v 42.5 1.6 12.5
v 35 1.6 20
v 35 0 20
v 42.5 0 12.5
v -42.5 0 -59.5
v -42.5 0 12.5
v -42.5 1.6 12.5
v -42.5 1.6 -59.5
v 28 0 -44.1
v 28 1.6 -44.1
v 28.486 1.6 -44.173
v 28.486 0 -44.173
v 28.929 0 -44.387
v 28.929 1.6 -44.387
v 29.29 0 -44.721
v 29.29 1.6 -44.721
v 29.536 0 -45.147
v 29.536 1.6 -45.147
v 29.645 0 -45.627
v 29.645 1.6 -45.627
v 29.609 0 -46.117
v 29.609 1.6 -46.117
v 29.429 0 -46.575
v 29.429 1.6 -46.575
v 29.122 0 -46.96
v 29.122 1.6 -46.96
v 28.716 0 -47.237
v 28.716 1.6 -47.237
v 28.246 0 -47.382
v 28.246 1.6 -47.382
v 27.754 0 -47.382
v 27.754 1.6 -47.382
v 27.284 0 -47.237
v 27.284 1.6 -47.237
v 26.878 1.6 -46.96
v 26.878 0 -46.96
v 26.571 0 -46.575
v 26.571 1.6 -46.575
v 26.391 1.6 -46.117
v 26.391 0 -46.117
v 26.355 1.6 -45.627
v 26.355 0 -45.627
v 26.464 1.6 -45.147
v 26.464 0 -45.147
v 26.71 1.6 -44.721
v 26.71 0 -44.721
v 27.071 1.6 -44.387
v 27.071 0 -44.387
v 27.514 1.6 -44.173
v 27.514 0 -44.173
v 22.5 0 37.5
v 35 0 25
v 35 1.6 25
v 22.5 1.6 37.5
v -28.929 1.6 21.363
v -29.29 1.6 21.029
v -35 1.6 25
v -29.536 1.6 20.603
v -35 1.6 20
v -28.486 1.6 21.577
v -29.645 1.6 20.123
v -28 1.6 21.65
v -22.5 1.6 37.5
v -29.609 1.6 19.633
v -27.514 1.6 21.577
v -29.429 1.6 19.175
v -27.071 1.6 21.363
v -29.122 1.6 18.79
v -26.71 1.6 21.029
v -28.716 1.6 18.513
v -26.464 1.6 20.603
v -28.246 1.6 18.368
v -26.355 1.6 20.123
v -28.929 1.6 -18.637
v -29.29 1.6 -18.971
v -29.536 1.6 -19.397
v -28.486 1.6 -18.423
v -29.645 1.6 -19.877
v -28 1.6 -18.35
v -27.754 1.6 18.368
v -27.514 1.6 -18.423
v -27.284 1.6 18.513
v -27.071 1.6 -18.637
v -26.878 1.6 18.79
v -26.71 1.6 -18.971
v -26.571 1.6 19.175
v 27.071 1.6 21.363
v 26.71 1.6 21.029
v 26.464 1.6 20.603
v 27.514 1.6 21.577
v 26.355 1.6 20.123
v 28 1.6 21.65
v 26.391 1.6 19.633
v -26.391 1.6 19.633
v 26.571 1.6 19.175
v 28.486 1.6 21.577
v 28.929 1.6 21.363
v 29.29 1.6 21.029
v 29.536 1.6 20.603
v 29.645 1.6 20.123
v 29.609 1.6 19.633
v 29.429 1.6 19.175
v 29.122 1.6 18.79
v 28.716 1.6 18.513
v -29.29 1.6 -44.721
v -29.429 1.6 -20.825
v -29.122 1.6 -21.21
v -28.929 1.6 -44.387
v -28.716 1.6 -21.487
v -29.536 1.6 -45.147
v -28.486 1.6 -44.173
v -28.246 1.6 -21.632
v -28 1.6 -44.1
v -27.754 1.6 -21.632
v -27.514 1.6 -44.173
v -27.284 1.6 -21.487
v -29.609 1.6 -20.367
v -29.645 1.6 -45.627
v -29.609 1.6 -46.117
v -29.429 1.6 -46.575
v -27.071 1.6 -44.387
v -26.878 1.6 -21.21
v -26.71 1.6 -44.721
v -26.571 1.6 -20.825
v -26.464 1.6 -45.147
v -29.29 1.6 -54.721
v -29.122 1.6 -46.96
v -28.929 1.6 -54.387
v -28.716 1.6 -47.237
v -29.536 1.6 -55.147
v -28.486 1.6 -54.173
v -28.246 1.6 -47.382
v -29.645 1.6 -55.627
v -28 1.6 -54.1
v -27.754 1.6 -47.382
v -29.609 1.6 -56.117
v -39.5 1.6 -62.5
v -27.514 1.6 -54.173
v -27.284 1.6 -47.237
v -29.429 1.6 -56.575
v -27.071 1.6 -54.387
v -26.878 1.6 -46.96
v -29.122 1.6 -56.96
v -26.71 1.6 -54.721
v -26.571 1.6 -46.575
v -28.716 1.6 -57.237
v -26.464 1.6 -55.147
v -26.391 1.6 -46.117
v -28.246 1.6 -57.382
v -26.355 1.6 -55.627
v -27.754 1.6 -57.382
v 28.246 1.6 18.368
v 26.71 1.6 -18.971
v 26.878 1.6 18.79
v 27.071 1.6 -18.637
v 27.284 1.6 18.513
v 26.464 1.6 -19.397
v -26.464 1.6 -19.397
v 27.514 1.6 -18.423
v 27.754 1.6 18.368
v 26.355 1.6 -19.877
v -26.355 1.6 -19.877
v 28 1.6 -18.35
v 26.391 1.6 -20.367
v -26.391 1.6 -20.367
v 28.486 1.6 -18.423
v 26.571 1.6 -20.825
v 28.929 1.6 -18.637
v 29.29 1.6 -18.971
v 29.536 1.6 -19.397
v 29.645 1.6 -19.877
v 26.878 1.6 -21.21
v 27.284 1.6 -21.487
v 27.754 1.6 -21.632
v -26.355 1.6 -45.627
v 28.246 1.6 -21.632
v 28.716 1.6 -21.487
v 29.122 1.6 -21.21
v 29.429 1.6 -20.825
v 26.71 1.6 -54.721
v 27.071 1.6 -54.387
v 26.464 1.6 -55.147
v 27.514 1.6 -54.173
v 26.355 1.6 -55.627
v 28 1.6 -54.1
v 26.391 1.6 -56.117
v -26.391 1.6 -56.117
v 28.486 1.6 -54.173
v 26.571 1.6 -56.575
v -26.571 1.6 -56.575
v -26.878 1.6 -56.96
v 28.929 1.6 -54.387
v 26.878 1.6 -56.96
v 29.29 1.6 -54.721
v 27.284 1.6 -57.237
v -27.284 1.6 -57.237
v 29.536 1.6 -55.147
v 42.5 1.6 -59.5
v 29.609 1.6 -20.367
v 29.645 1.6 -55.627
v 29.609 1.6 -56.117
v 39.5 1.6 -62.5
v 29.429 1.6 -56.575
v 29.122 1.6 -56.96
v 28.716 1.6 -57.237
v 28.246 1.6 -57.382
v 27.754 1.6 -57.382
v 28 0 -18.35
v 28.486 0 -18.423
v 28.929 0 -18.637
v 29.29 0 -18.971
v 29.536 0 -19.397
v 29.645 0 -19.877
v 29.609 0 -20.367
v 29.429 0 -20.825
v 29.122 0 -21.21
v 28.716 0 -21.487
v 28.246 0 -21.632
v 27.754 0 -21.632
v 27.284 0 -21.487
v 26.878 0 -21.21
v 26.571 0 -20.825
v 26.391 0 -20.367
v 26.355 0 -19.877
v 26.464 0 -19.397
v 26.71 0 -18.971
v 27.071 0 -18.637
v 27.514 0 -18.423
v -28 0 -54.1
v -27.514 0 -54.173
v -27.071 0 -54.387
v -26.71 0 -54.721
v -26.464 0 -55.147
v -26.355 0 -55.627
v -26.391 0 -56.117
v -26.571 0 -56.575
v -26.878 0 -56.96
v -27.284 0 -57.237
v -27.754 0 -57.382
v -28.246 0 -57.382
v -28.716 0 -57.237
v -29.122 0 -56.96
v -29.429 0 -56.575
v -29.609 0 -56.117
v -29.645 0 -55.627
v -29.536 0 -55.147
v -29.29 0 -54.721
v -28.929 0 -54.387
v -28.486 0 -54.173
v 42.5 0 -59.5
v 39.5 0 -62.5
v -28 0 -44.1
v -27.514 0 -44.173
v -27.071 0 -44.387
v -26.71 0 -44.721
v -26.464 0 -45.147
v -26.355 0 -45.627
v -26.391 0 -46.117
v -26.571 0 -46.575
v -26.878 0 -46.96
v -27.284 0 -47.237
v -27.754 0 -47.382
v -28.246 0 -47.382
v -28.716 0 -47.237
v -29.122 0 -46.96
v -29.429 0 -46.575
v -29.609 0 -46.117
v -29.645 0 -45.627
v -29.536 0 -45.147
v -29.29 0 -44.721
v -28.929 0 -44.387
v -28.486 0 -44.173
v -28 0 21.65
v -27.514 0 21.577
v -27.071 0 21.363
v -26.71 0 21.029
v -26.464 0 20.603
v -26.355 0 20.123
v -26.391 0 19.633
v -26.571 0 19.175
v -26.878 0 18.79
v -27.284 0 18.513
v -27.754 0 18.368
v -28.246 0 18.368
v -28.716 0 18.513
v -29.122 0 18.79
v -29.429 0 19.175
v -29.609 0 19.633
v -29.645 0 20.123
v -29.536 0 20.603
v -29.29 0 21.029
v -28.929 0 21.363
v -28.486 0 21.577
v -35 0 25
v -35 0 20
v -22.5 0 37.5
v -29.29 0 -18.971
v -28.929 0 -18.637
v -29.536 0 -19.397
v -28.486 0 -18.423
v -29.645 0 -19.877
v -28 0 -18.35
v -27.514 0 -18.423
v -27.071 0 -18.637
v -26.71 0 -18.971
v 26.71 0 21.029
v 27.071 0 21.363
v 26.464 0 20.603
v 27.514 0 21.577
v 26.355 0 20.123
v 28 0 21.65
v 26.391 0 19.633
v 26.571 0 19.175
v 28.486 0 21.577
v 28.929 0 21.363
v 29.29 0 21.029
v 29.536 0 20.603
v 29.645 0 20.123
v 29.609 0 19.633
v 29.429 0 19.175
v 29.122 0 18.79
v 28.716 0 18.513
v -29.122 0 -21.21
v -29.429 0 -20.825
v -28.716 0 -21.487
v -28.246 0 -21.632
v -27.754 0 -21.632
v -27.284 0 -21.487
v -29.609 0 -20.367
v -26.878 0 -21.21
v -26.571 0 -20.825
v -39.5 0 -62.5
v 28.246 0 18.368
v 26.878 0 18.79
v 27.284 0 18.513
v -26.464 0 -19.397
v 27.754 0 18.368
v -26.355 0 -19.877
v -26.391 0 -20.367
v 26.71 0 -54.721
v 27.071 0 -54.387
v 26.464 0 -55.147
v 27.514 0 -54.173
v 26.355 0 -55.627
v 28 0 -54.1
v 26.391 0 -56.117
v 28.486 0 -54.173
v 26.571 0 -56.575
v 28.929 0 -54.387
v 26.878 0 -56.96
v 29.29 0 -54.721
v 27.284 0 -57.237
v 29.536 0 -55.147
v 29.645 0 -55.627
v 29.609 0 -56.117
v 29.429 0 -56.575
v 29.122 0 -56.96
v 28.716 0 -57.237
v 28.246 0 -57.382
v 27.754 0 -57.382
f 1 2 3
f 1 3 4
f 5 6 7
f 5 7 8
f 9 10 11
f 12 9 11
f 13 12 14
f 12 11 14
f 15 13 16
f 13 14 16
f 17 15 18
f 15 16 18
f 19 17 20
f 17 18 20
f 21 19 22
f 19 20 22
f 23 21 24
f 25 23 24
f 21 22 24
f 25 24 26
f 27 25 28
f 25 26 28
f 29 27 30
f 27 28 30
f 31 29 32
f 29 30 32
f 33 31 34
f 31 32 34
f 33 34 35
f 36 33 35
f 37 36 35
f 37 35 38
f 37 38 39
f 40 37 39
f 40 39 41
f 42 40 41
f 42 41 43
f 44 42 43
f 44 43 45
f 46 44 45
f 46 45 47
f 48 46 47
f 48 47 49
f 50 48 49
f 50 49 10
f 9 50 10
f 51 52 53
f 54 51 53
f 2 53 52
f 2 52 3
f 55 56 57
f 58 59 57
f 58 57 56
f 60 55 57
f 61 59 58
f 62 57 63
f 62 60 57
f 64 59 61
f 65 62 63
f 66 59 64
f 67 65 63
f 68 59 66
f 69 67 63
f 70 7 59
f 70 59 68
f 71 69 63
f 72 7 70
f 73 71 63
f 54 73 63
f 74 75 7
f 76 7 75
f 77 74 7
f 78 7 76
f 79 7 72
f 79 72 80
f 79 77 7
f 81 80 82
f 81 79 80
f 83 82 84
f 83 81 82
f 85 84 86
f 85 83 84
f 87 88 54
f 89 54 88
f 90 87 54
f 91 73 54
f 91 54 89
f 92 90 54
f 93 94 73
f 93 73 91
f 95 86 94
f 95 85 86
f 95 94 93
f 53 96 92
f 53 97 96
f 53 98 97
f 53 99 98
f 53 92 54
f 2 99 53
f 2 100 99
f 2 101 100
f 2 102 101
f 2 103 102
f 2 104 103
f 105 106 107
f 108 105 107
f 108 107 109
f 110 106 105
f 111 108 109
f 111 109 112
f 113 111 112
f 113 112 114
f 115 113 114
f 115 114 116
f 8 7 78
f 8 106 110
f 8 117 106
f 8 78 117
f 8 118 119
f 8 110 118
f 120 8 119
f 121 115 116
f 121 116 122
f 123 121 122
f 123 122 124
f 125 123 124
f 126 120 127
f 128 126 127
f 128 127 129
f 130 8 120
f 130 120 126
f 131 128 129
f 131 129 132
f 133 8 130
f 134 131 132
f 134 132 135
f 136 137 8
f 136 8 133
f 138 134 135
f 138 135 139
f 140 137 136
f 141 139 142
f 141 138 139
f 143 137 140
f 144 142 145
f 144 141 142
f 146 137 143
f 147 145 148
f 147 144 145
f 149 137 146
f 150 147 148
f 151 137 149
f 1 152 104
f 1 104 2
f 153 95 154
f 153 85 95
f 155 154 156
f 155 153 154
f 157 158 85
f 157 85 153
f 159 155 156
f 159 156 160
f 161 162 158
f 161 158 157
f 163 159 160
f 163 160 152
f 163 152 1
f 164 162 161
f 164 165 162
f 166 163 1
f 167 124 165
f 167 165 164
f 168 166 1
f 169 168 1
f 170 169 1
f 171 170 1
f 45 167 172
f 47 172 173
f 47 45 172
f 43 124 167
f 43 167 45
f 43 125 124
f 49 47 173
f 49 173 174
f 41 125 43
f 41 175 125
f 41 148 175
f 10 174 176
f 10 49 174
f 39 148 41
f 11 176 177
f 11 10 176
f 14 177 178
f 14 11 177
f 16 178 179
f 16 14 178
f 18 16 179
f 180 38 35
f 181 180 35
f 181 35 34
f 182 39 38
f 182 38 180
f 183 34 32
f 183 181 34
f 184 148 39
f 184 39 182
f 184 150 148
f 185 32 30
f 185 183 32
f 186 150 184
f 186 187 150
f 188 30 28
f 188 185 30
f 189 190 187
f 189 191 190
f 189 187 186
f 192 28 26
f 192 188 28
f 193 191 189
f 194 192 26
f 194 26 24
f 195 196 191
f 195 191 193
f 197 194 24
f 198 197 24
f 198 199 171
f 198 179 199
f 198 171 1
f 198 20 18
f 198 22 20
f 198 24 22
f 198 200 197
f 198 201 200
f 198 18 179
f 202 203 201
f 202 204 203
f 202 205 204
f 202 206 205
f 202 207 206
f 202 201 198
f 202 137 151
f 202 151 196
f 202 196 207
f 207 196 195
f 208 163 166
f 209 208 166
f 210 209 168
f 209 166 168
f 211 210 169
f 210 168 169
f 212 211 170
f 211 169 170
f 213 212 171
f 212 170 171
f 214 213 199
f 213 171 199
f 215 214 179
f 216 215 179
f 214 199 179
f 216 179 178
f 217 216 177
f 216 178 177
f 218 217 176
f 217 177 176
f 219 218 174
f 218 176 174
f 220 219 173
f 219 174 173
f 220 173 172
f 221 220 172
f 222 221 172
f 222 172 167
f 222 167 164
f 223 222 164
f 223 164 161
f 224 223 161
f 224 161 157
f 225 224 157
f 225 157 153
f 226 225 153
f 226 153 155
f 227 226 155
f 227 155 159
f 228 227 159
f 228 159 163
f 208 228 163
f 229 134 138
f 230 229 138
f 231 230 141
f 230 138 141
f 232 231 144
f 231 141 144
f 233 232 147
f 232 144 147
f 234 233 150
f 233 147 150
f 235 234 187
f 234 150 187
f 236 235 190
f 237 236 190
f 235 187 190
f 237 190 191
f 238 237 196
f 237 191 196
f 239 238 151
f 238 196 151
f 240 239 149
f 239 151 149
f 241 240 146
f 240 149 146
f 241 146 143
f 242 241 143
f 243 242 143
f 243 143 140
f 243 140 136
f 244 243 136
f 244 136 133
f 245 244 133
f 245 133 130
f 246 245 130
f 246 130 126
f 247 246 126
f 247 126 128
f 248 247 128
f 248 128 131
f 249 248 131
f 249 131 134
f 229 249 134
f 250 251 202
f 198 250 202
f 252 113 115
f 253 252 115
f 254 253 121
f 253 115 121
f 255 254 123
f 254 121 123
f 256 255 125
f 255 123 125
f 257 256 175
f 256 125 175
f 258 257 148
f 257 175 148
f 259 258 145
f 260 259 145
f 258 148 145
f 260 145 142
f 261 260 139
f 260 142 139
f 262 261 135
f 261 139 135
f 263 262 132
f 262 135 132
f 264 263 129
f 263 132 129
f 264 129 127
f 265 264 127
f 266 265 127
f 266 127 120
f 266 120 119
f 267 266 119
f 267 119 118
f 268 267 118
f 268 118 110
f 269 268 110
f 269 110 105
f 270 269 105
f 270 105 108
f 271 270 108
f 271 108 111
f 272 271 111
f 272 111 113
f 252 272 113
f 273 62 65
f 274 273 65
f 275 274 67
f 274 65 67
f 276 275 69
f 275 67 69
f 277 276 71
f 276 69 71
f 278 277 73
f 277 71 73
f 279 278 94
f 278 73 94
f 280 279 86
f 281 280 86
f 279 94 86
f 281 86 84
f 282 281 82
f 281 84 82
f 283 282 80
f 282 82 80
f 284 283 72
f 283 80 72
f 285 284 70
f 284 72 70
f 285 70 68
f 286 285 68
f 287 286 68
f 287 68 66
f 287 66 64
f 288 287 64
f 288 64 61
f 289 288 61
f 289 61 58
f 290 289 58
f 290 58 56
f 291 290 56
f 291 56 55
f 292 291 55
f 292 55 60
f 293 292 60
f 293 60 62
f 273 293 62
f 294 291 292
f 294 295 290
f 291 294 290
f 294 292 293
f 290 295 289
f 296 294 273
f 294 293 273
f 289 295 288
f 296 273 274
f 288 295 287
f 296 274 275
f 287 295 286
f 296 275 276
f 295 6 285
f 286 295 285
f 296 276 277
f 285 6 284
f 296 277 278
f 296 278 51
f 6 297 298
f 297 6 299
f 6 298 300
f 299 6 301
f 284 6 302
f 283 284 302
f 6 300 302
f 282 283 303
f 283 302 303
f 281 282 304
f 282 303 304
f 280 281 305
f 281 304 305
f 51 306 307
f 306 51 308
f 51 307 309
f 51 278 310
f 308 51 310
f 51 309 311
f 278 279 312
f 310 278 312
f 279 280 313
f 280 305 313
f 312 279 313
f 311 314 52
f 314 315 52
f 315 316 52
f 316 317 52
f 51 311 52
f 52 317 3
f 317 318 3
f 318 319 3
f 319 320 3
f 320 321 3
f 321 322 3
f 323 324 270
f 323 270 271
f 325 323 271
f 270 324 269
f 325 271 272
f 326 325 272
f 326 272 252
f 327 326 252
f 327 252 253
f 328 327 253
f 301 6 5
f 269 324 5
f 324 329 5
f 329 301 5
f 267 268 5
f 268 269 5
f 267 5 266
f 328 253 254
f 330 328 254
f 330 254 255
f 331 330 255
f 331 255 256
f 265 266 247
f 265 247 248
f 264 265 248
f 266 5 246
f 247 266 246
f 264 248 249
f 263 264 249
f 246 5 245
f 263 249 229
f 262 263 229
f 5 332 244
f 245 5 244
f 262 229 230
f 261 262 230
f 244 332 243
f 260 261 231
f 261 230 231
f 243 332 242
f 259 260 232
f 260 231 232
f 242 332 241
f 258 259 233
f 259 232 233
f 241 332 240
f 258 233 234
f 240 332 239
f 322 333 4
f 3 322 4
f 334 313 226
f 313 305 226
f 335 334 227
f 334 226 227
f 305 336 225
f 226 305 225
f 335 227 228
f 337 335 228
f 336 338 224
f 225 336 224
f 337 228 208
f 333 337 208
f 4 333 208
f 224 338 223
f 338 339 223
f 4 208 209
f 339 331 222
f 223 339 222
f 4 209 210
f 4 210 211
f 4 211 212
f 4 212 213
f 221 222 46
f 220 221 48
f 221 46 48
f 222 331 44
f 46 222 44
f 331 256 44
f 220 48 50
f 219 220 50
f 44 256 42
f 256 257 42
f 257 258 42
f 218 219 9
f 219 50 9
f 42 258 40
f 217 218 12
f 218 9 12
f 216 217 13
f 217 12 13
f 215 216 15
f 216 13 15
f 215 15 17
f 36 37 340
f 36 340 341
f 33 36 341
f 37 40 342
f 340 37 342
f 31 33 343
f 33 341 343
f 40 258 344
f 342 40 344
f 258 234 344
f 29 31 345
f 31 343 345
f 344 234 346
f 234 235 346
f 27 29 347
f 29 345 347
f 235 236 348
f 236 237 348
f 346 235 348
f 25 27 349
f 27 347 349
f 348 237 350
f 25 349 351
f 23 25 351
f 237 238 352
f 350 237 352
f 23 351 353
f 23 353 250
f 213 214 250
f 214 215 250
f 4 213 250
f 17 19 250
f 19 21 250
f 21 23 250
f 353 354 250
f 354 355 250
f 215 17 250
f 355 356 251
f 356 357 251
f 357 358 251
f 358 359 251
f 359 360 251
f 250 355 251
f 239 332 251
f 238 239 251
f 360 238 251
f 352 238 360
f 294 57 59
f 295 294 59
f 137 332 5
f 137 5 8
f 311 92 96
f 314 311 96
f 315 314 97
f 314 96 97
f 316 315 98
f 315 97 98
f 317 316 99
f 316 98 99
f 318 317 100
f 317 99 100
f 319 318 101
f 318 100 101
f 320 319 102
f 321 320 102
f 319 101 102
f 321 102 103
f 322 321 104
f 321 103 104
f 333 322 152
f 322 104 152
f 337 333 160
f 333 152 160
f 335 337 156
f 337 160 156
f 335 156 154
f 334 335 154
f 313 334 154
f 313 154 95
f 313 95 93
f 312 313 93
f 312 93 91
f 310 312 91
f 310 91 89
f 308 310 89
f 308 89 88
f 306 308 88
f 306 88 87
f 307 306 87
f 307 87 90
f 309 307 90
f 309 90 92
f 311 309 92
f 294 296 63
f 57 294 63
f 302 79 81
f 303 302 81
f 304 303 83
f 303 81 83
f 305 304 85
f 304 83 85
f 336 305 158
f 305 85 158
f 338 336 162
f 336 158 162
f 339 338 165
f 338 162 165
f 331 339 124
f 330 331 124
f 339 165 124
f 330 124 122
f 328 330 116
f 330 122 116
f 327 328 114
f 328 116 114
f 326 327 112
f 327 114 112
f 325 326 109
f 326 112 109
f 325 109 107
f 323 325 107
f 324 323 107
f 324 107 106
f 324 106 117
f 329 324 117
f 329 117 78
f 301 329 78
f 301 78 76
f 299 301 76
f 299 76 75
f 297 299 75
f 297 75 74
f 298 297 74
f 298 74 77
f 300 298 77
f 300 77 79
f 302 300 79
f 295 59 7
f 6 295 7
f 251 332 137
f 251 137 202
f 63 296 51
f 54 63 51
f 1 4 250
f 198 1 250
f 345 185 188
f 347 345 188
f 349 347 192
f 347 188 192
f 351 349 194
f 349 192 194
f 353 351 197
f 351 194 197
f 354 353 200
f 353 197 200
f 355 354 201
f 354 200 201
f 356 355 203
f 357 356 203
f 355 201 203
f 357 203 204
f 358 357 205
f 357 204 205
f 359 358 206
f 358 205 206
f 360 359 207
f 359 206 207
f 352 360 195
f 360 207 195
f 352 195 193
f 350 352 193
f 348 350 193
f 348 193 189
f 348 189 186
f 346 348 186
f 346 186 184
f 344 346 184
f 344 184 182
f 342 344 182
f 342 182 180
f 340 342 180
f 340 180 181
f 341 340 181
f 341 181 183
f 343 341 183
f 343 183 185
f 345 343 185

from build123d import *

# Parameters (mm, degrees)
SKETCH_1_W          = 85
SKETCH_1_H          = 75
EXTRUDE_1_DEPTH     = 1.6
CUT_EXTRUDE_1_REACH = 58.701
SKETCH_2_R          = 1.65
SKETCH_8_W          = 85
SKETCH_8_H          = 25
EXTRUDE_3_DEPTH     = 1.6
CHAMFER_2_SIZE      = 3
CHAMFER_3_SIZE      = 20
CUT_EXTRUDE_4_REACH = 77.598
CUT_EXTRUDE_5_REACH = 77.598
SKETCH_9_R          = 1.65


with BuildPart() as part:
    # 草图1 → 凸台-拉伸1 (new body)
    with BuildSketch(Plane(origin=(0, 0, 0), x_dir=(1, 0, 0), z_dir=(0, 1, 0))):
        Rectangle(SKETCH_1_W, SKETCH_1_H)
    extrude(amount=EXTRUDE_1_DEPTH)

    # 草图2 → 切除-拉伸1 (cut, up to next)
    with BuildSketch(Plane(origin=(0, 1.6, 0), x_dir=(1, 0, 0), z_dir=(0, 1, 0)), mode=Mode.PRIVATE) as cut_extrude_1_sk1:
        with Locations(Location((-28, 20, 0), (0, 0, 270))):
            Circle(SKETCH_2_R)
    cut_extrude_1_tool1 = extrude(cut_extrude_1_sk1.sketch, amount=-CUT_EXTRUDE_1_REACH, mode=Mode.PRIVATE) & part.part
    # 草图2 → 切除-拉伸1 (cut, up to next)
    with BuildSketch(Plane(origin=(0, 1.6, 0), x_dir=(1, 0, 0), z_dir=(0, 1, 0)), mode=Mode.PRIVATE) as cut_extrude_1_sk2:
        with Locations(Location((-28, -20, 0), (0, 0, 270))):
            Circle(SKETCH_2_R)
    cut_extrude_1_tool2 = extrude(cut_extrude_1_sk2.sketch, amount=-CUT_EXTRUDE_1_REACH, mode=Mode.PRIVATE) & part.part
    # 草图2 → 切除-拉伸1 (cut, up to next)
    with BuildSketch(Plane(origin=(0, 1.6, 0), x_dir=(1, 0, 0), z_dir=(0, 1, 0)), mode=Mode.PRIVATE) as cut_extrude_1_sk3:
        with Locations(Location((28, 20, 0), (0, 0, 270))):
            Circle(SKETCH_2_R)
    cut_extrude_1_tool3 = extrude(cut_extrude_1_sk3.sketch, amount=-CUT_EXTRUDE_1_REACH, mode=Mode.PRIVATE) & part.part
    # 草图2 → 切除-拉伸1 (cut, up to next)
    with BuildSketch(Plane(origin=(0, 1.6, 0), x_dir=(1, 0, 0), z_dir=(0, 1, 0)), mode=Mode.PRIVATE) as cut_extrude_1_sk4:
        with Locations(Location((28, -20, 0), (0, 0, 270))):
            Circle(SKETCH_2_R)
    cut_extrude_1_tool4 = extrude(cut_extrude_1_sk4.sketch, amount=-CUT_EXTRUDE_1_REACH, mode=Mode.PRIVATE) & part.part
    add(cut_extrude_1_tool1.solids().sort_by_distance((-28, 1.6, -20))[0], mode=Mode.SUBTRACT)
    add(cut_extrude_1_tool2.solids().sort_by_distance((-28, 1.6, 20))[0], mode=Mode.SUBTRACT)
    add(cut_extrude_1_tool3.solids().sort_by_distance((28, 1.6, -20))[0], mode=Mode.SUBTRACT)
    add(cut_extrude_1_tool4.solids().sort_by_distance((28, 1.6, 20))[0], mode=Mode.SUBTRACT)

    # 草图8 → 凸台-拉伸3 (add)
    with BuildSketch(Plane(origin=(0, 0, 0), x_dir=(1, 0, 0), z_dir=(0, 1, 0))):
        with Locations((0, 50)):
            Rectangle(SKETCH_8_W, SKETCH_8_H)
    extrude(amount=EXTRUDE_3_DEPTH)

    # 倒角2
    chamfer_2_edges = [part.edges().sort_by_distance(p)[0] for p in [
        (42.5, 0.8, -62.5),
        (-42.5, 0.8, -62.5),
    ]]
    chamfer(chamfer_2_edges, length=CHAMFER_2_SIZE)

    # 倒角3
    chamfer_3_edges = [part.edges().sort_by_distance(p)[0] for p in [
        (42.5, 0.8, 37.5),
        (-42.5, 0.8, 37.5),
    ]]
    chamfer(chamfer_3_edges, length=CHAMFER_3_SIZE)

    # 草图7 → 切除-拉伸4 (cut, up to next)
    with BuildSketch(Plane(origin=(0, 1.6, 0), x_dir=(1, 0, 0), z_dir=(0, 1, 0)), mode=Mode.PRIVATE) as cut_extrude_4_sk1:
        Polygon((-35, -25), (-35, -20), (-42.5, -12.5), (-42.5, -17.5), align=None)
    cut_extrude_4_tool1 = extrude(cut_extrude_4_sk1.sketch, amount=-CUT_EXTRUDE_4_REACH, mode=Mode.PRIVATE) & part.part
    cut_extrude_4 = cut_extrude_4_tool1.solids().sort_by_distance((-38.75, 1.6, 18.75))[0]
    add(cut_extrude_4, mode=Mode.SUBTRACT)

    # 镜向1: 切除-拉伸4 across plane
    add(cut_extrude_4.mirror(Plane(origin=(0, 0, 0), x_dir=(0, 0, 1), z_dir=(1, 0, 0))), mode=Mode.SUBTRACT)

    # 草图9 → 切除-拉伸5 (cut, up to next)
    with BuildSketch(Plane(origin=(0, 1.6, 0), x_dir=(1, 0, 0), z_dir=(0, 1, 0)), mode=Mode.PRIVATE) as cut_extrude_5_sk1:
        with Locations(Location((-28, 55.75, 0), (0, 0, 270))):
            Circle(SKETCH_9_R)
    cut_extrude_5_tool1 = extrude(cut_extrude_5_sk1.sketch, amount=-CUT_EXTRUDE_5_REACH, mode=Mode.PRIVATE) & part.part
    # 草图9 → 切除-拉伸5 (cut, up to next)
    with BuildSketch(Plane(origin=(0, 1.6, 0), x_dir=(1, 0, 0), z_dir=(0, 1, 0)), mode=Mode.PRIVATE) as cut_extrude_5_sk2:
        with Locations(Location((-28, 45.75, 0), (0, 0, 270))):
            Circle(SKETCH_9_R)
    cut_extrude_5_tool2 = extrude(cut_extrude_5_sk2.sketch, amount=-CUT_EXTRUDE_5_REACH, mode=Mode.PRIVATE) & part.part
    # 草图9 → 切除-拉伸5 (cut, up to next)
    with BuildSketch(Plane(origin=(0, 1.6, 0), x_dir=(1, 0, 0), z_dir=(0, 1, 0)), mode=Mode.PRIVATE) as cut_extrude_5_sk3:
        with Locations(Location((28, 55.75, 0), (0, 0, 270))):
            Circle(SKETCH_9_R)
    cut_extrude_5_tool3 = extrude(cut_extrude_5_sk3.sketch, amount=-CUT_EXTRUDE_5_REACH, mode=Mode.PRIVATE) & part.part
    # 草图9 → 切除-拉伸5 (cut, up to next)
    with BuildSketch(Plane(origin=(0, 1.6, 0), x_dir=(1, 0, 0), z_dir=(0, 1, 0)), mode=Mode.PRIVATE) as cut_extrude_5_sk4:
        with Locations(Location((28, 45.75, 0), (0, 0, 270))):
            Circle(SKETCH_9_R)
    cut_extrude_5_tool4 = extrude(cut_extrude_5_sk4.sketch, amount=-CUT_EXTRUDE_5_REACH, mode=Mode.PRIVATE) & part.part
    add(cut_extrude_5_tool1.solids().sort_by_distance((-28, 1.6, -55.75))[0], mode=Mode.SUBTRACT)
    add(cut_extrude_5_tool2.solids().sort_by_distance((-28, 1.6, -45.75))[0], mode=Mode.SUBTRACT)
    add(cut_extrude_5_tool3.solids().sort_by_distance((28, 1.6, -55.75))[0], mode=Mode.SUBTRACT)
    add(cut_extrude_5_tool4.solids().sort_by_distance((28, 1.6, -45.75))[0], mode=Mode.SUBTRACT)


solid = part.part
